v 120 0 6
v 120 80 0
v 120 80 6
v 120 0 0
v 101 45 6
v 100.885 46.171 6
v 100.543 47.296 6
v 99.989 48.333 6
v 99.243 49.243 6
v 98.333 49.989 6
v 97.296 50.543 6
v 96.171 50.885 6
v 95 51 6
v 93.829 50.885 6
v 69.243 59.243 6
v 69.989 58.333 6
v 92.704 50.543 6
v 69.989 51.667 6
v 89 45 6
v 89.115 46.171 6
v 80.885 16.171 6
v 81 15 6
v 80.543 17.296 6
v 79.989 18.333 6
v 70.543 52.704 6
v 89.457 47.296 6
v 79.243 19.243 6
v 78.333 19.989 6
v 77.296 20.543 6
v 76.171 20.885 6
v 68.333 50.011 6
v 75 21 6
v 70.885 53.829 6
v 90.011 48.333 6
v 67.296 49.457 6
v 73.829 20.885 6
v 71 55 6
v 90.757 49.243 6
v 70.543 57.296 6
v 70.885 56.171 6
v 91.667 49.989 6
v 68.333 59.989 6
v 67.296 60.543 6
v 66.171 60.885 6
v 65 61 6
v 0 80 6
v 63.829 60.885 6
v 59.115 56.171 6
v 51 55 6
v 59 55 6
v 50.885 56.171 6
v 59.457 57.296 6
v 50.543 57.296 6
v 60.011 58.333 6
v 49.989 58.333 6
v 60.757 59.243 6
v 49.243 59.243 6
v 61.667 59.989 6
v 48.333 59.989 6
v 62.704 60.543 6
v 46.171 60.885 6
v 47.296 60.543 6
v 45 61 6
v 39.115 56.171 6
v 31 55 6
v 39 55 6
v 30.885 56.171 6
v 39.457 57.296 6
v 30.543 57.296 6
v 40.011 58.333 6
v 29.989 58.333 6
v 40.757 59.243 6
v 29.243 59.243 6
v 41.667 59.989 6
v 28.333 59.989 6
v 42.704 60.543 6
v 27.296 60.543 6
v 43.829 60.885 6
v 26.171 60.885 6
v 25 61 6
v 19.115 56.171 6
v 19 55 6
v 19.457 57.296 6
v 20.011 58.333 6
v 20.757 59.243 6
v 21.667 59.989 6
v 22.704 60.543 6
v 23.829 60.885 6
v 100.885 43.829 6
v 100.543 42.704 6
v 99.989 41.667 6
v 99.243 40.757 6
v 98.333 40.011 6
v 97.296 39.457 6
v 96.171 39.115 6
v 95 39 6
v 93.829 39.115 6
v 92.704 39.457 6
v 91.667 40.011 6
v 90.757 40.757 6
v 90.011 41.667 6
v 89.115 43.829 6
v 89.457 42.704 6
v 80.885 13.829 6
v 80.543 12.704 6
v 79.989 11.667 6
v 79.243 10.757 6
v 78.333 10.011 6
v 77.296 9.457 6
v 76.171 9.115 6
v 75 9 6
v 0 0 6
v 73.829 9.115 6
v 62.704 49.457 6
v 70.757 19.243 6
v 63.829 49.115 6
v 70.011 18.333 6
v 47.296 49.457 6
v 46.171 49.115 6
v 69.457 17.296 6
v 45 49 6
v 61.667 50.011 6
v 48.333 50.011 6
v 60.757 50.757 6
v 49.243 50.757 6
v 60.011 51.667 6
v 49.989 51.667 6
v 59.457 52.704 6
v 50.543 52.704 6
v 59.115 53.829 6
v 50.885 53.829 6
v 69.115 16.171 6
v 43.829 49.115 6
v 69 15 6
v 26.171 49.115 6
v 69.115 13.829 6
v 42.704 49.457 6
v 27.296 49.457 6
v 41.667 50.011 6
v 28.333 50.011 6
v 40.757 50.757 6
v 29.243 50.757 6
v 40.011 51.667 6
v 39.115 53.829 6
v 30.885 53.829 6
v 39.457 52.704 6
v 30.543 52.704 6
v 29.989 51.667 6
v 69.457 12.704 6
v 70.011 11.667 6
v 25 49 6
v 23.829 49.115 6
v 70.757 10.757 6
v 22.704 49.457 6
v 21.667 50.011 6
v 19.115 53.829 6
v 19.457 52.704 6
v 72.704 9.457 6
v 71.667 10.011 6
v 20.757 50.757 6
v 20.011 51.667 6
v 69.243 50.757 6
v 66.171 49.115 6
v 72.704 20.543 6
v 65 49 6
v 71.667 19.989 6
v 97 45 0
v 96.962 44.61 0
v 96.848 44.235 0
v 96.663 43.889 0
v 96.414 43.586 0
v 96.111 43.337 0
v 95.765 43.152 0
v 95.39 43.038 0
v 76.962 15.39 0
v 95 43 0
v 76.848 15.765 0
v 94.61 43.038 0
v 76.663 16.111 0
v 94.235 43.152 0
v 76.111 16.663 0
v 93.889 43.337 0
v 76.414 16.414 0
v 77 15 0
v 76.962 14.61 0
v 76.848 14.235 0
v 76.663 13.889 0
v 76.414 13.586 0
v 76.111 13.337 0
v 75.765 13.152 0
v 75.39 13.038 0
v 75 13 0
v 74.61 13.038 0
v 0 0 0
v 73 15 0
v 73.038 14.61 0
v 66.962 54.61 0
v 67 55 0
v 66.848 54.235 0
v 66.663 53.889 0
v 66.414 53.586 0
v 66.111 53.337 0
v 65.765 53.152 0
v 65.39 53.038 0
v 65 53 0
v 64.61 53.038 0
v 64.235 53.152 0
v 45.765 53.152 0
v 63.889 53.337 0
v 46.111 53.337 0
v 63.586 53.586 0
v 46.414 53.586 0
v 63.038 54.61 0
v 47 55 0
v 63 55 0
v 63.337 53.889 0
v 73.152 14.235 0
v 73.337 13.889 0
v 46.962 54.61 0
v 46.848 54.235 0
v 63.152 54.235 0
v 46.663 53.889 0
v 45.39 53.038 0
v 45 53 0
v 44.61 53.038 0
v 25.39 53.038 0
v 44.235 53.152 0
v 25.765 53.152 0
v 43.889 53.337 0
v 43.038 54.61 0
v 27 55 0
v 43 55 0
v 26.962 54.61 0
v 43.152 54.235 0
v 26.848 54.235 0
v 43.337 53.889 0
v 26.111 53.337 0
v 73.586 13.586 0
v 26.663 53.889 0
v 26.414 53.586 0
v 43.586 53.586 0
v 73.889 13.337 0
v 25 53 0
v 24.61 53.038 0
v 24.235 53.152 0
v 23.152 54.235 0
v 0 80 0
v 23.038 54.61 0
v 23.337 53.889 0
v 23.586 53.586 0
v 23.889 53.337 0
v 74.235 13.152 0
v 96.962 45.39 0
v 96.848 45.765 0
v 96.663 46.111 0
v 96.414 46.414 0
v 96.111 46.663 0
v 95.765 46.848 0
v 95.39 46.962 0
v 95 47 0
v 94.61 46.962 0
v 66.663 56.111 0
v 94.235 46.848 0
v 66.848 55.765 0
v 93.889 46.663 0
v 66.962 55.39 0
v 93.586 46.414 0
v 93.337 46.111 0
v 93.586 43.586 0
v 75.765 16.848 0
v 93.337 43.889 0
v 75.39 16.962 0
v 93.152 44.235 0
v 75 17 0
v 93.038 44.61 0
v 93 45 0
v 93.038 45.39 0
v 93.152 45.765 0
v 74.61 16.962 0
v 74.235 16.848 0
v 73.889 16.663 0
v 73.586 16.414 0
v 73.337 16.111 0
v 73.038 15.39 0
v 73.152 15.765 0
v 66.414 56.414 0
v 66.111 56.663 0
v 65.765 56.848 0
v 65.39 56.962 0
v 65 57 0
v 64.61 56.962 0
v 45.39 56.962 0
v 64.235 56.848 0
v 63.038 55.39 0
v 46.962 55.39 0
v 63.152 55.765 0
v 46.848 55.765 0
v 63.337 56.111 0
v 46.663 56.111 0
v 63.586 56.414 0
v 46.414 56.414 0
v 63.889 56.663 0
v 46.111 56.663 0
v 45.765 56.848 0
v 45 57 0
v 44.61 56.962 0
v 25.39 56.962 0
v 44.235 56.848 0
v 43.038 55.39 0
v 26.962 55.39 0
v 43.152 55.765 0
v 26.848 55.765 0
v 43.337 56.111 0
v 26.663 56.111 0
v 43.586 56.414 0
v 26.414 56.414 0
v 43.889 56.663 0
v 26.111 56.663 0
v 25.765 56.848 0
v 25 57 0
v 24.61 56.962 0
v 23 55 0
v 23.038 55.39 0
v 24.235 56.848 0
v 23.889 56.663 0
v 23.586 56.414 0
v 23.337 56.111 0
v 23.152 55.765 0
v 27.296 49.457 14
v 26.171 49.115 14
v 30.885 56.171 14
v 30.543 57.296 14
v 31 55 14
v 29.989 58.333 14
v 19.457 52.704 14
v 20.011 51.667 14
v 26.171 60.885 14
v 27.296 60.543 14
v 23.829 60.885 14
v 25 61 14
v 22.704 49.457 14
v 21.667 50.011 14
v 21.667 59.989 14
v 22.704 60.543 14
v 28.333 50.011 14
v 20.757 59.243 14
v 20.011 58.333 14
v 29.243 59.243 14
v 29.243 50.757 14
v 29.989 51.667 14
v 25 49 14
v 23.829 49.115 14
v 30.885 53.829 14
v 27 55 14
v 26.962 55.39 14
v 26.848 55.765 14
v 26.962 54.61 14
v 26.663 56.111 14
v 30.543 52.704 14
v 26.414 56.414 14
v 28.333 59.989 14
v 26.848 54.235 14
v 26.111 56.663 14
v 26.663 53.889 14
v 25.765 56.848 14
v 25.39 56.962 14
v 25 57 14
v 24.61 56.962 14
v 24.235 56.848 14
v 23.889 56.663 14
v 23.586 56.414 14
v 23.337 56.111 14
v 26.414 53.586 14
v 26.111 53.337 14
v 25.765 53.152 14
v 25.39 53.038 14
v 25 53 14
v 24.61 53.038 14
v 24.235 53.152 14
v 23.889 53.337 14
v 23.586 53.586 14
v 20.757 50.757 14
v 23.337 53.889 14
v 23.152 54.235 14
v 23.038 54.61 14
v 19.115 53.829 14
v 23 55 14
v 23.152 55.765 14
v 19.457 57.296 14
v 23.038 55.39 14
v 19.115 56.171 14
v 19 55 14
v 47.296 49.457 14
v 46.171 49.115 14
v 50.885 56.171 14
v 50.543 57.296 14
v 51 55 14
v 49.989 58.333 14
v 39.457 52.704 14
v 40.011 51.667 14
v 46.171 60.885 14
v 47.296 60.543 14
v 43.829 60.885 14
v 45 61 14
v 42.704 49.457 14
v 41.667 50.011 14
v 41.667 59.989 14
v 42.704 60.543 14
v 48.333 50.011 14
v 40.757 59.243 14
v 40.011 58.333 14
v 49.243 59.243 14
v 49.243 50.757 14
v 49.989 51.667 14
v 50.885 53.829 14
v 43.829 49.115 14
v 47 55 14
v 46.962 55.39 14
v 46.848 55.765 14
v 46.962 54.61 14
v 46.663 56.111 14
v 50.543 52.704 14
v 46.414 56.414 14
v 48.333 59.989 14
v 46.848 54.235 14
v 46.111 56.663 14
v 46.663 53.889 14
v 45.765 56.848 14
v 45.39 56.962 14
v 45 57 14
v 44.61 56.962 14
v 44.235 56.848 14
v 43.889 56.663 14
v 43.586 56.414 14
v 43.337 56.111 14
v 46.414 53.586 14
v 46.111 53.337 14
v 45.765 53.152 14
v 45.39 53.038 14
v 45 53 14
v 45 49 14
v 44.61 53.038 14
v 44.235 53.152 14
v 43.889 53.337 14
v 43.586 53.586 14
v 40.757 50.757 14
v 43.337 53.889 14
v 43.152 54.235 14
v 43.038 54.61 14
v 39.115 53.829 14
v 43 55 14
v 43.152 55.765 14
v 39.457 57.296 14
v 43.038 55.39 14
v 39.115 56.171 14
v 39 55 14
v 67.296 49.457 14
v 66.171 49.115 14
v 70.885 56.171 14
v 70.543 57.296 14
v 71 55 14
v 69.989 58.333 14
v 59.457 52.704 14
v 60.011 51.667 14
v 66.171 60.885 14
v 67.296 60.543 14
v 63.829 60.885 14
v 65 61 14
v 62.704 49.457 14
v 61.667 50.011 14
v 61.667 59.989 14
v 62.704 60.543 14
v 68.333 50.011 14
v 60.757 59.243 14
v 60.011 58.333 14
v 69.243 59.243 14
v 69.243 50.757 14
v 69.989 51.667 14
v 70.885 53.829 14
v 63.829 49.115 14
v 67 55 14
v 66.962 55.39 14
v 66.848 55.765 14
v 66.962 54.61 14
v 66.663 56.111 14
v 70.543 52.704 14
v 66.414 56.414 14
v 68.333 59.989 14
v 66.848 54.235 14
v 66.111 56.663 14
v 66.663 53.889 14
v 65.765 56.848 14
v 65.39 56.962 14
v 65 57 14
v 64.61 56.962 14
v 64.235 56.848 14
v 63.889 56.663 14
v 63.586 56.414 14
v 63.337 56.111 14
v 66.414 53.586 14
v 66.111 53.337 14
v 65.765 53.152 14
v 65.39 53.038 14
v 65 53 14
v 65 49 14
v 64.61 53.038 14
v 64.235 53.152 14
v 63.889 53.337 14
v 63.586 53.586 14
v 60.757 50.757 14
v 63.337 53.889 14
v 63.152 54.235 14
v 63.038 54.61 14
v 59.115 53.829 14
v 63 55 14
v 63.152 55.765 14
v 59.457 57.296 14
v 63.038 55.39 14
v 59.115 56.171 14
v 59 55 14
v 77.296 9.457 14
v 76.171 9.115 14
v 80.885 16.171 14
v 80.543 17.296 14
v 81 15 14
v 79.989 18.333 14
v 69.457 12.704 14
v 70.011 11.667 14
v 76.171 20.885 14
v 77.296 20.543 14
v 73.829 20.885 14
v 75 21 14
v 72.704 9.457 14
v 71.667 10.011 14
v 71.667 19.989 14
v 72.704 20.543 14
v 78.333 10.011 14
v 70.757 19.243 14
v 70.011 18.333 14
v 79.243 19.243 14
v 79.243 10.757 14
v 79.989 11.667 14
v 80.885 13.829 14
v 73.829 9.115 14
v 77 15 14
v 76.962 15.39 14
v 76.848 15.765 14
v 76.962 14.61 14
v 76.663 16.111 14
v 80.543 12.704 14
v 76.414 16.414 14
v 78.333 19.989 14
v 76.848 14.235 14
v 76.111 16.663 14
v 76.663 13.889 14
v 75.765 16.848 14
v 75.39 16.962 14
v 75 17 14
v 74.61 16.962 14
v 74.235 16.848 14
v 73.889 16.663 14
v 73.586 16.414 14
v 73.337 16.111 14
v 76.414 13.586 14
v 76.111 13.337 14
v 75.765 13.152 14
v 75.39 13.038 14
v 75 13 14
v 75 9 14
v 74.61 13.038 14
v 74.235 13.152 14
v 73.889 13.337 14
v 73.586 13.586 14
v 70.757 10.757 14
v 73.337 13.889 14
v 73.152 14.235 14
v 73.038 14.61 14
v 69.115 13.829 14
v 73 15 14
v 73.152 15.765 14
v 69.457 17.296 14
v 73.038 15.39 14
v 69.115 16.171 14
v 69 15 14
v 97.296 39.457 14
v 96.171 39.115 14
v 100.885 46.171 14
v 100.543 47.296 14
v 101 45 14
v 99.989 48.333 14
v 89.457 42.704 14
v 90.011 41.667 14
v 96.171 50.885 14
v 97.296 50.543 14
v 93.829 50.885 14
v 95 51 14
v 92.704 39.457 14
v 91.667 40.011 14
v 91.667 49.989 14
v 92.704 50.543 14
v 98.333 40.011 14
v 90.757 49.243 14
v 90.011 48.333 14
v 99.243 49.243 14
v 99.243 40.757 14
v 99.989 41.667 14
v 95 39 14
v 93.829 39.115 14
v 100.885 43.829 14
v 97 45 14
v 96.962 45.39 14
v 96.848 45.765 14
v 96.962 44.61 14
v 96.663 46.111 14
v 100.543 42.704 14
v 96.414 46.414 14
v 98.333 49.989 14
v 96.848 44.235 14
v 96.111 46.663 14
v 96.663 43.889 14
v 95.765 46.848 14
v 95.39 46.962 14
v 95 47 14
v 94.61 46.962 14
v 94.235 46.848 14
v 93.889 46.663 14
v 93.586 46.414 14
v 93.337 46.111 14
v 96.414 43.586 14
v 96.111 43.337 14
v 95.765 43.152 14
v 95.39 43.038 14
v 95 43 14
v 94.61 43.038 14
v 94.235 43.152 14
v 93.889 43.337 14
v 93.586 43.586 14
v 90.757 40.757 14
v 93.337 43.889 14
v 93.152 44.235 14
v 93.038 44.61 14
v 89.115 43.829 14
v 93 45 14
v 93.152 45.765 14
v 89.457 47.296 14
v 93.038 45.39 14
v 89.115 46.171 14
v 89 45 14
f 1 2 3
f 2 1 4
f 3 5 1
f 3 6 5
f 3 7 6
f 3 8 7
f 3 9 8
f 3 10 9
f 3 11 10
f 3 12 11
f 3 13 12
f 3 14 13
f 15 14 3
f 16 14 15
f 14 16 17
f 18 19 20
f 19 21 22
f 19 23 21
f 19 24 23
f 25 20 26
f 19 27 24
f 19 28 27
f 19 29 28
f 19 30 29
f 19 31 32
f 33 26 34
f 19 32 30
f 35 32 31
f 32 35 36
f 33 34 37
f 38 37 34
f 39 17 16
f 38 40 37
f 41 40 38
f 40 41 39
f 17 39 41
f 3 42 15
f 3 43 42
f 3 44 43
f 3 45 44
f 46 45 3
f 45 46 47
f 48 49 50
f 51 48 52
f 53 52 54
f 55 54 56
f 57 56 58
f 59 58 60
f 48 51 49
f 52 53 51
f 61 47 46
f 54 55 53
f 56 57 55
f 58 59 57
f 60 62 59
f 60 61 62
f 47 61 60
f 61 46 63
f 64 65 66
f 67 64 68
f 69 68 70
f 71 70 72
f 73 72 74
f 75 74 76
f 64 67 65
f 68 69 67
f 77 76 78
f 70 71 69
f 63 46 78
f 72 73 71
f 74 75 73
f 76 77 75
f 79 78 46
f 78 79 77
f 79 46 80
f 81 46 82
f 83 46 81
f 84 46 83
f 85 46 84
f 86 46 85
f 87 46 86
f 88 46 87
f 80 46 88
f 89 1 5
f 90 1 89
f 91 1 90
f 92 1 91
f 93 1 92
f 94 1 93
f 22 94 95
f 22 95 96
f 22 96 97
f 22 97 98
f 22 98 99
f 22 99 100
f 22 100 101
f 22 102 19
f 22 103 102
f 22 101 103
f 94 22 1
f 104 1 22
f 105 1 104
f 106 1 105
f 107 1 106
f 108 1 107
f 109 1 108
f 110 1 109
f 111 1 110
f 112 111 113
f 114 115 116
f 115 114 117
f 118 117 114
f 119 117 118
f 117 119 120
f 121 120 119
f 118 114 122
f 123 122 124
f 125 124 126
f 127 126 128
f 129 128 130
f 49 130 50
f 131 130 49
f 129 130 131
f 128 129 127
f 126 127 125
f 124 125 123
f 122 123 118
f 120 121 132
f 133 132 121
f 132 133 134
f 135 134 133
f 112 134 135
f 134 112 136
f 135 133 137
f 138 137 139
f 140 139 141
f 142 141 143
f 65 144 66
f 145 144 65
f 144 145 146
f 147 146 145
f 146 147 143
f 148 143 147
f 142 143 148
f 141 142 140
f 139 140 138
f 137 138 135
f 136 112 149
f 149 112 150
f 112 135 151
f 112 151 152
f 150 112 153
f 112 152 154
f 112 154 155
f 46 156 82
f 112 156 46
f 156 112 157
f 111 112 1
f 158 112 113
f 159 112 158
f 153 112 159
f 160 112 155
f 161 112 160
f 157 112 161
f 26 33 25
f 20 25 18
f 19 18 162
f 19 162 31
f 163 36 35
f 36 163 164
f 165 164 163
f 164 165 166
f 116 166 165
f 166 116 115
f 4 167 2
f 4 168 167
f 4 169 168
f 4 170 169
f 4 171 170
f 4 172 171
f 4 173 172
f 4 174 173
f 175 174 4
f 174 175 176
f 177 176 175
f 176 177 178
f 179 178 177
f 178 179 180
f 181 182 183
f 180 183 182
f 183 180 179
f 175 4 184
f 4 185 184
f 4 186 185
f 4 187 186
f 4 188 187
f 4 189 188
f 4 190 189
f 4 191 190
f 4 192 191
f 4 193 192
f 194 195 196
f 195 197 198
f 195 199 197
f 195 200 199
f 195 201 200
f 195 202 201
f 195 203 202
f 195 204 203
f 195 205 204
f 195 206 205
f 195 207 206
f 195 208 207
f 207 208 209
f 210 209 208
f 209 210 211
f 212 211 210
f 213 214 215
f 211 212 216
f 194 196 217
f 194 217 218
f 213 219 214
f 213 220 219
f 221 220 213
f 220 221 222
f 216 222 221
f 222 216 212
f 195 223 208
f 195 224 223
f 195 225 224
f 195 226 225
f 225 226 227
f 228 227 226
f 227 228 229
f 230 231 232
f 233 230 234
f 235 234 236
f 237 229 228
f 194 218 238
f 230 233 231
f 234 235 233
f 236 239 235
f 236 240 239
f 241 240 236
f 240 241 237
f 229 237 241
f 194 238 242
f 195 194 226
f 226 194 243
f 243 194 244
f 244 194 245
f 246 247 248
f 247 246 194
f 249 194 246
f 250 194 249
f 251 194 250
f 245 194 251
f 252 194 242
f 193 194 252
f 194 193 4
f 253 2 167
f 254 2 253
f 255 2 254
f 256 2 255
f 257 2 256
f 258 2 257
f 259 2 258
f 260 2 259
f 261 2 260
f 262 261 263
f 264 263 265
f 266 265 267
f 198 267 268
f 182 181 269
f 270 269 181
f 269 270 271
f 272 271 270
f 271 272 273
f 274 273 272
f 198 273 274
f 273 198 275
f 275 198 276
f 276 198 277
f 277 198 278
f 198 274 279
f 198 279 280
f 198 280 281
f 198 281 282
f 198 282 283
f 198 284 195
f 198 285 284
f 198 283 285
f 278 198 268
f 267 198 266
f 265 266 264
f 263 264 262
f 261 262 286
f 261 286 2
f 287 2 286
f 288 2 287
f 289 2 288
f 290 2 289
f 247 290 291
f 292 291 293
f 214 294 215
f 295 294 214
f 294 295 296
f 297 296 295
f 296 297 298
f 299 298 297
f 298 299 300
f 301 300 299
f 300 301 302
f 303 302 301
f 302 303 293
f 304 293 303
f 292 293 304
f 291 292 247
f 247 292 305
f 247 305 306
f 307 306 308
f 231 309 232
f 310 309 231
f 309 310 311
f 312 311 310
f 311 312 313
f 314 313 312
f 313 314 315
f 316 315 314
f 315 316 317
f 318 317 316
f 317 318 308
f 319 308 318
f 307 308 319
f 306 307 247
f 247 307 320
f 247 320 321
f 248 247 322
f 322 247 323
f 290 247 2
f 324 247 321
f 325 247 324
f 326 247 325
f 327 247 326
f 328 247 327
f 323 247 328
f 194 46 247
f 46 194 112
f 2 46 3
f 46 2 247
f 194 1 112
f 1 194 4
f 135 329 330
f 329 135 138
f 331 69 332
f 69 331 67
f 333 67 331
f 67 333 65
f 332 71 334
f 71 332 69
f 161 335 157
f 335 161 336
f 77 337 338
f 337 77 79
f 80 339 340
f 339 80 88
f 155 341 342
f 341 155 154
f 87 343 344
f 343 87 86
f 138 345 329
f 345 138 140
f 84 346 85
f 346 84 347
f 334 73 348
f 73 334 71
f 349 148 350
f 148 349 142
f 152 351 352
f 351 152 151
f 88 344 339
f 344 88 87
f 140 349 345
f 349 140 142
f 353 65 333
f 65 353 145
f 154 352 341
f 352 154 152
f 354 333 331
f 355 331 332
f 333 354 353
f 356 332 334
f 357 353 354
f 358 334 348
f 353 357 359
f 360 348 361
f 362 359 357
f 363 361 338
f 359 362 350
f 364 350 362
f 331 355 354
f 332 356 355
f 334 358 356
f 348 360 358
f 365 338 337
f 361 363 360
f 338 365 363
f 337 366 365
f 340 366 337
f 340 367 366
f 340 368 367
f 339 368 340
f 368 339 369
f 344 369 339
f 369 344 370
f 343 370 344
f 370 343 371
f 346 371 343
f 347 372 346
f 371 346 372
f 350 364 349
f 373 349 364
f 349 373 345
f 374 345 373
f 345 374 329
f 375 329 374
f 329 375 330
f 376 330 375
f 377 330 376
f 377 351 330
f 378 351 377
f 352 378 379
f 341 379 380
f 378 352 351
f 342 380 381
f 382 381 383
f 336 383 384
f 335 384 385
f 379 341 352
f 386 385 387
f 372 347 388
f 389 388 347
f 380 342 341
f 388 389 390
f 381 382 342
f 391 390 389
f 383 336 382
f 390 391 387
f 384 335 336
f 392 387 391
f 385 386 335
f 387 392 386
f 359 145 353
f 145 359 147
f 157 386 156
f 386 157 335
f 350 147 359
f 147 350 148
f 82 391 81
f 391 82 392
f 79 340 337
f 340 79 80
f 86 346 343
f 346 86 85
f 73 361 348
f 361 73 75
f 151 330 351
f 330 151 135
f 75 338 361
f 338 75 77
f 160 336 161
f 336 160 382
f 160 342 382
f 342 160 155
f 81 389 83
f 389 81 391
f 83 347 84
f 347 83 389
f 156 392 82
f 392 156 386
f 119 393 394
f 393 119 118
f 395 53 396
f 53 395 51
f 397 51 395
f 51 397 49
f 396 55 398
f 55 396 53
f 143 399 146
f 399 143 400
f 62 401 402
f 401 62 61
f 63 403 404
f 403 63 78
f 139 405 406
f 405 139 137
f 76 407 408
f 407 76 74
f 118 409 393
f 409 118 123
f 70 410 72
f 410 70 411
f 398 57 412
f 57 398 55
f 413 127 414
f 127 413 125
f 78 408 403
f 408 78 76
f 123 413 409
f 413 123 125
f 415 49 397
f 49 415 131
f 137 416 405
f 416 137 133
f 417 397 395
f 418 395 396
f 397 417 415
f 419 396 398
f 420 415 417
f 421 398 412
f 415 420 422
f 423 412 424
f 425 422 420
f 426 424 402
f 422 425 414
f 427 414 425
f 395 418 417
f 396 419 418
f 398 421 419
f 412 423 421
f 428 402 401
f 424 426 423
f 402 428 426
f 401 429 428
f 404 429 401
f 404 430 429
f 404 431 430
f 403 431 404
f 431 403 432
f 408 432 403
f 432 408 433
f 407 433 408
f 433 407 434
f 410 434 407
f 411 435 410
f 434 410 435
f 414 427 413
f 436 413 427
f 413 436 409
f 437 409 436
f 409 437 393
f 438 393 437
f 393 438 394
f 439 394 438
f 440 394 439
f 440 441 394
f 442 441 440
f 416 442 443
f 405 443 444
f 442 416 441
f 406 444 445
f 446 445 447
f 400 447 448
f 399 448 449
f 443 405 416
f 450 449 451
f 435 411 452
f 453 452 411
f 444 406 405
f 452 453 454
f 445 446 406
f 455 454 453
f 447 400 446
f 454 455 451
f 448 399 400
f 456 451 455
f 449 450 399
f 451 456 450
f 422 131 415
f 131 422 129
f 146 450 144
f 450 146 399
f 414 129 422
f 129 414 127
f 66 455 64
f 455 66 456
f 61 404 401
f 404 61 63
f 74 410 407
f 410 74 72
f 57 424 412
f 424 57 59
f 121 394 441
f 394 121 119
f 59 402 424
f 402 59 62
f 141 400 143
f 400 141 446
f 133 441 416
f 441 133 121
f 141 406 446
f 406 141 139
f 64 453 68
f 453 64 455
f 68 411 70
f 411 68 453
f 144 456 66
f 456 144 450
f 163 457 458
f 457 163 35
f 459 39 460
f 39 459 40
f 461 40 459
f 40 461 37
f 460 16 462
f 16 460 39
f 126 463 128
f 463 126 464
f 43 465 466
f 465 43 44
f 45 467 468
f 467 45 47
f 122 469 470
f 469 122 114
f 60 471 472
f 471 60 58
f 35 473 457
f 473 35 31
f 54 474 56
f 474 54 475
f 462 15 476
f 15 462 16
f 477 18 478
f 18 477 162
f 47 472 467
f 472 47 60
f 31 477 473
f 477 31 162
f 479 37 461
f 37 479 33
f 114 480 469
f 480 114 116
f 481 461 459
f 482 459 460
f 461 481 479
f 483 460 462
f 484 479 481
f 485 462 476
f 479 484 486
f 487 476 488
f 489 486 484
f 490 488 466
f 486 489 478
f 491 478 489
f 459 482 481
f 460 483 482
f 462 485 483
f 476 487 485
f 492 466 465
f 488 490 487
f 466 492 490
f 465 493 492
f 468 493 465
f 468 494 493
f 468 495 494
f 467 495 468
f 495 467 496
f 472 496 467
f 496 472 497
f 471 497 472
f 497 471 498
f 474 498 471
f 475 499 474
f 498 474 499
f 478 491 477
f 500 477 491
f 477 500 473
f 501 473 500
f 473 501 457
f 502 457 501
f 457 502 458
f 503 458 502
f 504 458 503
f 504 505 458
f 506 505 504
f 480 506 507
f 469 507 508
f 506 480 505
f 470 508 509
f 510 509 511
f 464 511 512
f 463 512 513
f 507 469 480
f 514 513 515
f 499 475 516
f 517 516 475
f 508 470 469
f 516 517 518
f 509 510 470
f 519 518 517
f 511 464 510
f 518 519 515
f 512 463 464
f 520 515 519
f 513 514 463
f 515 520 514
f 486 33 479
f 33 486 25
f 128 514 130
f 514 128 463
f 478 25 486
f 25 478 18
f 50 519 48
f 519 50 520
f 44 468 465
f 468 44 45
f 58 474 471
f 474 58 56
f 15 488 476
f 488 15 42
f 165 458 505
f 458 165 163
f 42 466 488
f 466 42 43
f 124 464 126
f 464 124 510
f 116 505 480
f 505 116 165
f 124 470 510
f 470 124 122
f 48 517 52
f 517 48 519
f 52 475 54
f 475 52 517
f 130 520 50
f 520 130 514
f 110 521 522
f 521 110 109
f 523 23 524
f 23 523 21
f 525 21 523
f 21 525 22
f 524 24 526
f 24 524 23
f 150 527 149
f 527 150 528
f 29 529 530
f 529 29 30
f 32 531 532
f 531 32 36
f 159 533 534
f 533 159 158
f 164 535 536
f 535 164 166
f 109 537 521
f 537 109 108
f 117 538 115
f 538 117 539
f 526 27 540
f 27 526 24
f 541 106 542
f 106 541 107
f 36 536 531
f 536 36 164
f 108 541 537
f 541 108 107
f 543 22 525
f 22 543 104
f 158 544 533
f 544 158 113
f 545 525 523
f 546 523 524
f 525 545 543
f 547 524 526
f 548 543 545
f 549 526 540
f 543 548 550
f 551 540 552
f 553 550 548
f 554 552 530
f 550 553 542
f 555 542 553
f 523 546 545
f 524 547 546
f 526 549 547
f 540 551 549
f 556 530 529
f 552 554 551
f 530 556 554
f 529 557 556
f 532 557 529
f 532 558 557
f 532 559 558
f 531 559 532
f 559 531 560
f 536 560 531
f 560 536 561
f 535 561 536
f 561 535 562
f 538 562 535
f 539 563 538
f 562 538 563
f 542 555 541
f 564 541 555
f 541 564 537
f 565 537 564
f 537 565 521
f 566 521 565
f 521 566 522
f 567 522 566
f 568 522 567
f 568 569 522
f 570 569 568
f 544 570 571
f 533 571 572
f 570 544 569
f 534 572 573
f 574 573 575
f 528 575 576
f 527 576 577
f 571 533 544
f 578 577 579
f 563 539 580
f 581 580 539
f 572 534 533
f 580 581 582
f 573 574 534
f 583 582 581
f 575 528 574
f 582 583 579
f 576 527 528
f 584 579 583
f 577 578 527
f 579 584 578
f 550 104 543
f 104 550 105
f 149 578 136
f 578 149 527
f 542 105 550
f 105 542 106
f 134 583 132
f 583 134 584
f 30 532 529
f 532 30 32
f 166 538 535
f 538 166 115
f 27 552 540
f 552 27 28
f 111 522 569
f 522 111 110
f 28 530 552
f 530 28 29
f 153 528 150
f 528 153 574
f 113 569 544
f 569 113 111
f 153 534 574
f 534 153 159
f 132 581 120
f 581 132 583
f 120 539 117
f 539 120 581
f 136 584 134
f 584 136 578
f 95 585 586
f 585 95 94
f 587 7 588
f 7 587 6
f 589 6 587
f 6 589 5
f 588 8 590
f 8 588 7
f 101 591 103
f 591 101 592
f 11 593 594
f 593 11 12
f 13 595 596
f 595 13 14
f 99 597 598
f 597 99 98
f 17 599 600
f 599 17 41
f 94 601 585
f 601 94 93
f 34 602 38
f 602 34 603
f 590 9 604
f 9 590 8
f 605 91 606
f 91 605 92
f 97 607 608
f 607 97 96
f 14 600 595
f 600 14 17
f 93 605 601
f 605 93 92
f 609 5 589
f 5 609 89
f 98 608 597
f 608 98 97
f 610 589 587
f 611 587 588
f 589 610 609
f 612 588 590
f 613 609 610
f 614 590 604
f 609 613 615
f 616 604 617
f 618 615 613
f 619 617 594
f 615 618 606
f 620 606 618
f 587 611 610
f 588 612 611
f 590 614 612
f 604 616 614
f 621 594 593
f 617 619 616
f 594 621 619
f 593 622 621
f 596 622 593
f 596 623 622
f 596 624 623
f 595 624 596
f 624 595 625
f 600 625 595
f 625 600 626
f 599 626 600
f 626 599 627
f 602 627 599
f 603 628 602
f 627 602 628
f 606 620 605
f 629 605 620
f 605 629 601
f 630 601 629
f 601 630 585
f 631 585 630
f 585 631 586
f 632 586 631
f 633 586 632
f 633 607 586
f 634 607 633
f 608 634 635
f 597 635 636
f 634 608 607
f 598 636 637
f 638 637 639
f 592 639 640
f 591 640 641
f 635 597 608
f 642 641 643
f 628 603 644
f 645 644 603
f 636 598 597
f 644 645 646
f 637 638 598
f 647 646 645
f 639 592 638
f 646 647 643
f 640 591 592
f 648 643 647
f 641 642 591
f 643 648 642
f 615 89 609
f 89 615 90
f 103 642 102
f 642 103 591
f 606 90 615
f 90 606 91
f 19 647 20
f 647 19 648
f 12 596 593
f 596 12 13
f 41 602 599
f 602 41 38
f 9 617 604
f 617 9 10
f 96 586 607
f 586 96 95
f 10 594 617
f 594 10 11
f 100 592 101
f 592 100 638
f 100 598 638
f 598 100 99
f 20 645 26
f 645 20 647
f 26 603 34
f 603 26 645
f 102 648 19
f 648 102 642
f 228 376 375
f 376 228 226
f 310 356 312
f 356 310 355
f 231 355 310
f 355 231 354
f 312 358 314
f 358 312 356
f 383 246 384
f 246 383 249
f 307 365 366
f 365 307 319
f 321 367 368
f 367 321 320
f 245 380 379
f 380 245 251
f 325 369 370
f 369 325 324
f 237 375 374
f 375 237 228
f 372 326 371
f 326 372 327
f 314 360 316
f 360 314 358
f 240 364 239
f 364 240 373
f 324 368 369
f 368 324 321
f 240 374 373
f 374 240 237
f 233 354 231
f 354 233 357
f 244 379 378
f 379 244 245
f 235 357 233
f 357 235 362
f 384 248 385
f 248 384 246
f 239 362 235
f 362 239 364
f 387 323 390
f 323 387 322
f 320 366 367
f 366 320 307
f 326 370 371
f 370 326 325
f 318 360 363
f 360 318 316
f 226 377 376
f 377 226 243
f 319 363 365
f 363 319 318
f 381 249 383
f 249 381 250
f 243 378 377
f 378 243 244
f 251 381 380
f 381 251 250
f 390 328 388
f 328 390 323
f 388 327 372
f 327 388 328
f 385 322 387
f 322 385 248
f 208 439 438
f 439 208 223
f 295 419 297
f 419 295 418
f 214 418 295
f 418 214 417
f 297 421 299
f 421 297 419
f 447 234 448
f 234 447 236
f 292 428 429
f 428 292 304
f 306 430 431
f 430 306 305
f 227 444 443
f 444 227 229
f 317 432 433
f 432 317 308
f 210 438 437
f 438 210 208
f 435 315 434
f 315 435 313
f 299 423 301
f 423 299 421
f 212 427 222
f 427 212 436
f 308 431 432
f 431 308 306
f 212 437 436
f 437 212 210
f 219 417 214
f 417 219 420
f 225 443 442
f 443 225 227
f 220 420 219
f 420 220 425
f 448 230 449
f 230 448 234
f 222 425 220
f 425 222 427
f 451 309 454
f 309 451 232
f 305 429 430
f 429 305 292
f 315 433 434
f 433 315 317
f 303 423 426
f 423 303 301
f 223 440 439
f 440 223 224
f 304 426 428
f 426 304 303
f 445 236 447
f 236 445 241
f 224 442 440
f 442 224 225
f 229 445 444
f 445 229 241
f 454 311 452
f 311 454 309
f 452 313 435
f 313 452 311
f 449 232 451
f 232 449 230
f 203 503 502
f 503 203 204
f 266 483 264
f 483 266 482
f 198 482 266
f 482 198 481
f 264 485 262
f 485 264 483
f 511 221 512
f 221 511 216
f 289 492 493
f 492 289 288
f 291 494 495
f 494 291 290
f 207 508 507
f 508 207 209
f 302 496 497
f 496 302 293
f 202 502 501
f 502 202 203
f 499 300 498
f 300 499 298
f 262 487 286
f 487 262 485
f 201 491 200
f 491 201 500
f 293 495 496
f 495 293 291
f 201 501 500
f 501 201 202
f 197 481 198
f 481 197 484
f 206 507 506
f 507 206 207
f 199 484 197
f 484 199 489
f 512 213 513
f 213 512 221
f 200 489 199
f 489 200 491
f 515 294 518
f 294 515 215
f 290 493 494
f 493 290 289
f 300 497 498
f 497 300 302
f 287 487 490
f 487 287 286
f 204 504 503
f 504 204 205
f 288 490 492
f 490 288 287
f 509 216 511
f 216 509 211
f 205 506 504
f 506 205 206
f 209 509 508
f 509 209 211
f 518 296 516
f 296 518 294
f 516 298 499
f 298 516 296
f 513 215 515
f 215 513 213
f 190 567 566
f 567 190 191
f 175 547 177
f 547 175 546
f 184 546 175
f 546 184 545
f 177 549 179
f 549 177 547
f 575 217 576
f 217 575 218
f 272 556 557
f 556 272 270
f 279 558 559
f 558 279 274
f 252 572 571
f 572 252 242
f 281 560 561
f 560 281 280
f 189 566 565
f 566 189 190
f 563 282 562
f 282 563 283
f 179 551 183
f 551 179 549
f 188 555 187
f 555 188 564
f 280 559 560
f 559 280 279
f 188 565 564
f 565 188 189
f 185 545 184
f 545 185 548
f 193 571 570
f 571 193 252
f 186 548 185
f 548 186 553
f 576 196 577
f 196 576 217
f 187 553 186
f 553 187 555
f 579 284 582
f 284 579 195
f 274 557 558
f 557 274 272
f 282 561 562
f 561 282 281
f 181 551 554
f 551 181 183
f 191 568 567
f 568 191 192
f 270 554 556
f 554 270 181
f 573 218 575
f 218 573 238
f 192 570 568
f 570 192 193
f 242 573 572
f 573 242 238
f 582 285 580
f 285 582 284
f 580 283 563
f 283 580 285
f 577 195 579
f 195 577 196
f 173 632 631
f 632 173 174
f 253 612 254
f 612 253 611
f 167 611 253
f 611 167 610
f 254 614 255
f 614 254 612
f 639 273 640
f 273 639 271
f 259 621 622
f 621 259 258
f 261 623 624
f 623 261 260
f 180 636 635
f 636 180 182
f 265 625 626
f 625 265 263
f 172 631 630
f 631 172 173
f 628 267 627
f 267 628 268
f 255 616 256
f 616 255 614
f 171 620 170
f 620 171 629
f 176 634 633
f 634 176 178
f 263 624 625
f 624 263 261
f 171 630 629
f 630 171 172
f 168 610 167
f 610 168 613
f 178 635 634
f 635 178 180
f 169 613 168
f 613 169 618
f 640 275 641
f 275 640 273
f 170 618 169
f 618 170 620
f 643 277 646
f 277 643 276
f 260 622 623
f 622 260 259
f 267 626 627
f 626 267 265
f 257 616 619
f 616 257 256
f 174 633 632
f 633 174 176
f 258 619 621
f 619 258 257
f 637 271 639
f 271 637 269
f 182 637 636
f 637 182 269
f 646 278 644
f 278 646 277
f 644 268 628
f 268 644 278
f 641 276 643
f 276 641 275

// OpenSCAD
$fn = 32;

// ----------------------------------------------------------------------
// Boss field: plate with bosses at given coordinates
// ----------------------------------------------------------------------

// --- parameters (mm) ---
plate_l = 120;            // plate length, X
plate_w = 80;             // plate width, Y
plate_t = 6;              // plate thickness, Z
boss_d = 12;              // boss diameter
boss_h = 8;               // boss height above the plate
bore_d = 4;               // boss bore
fit_tol = 0.1;            // tolerance for press fits, mm
free_tol = 0.3;           // tolerance for clearance fits, mm

total_h = plate_t + boss_h;  // overall height

difference() {
  union() {
    cube([plate_l, plate_w, plate_t]);
    translate([25, 55, plate_t]) cylinder(h = boss_h, d = boss_d);
    translate([45, 55, plate_t]) cylinder(h = boss_h, d = boss_d);
    translate([65, 55, plate_t]) cylinder(h = boss_h, d = boss_d);
    translate([75, 15, plate_t]) cylinder(h = boss_h, d = boss_d);
    translate([95, 45, plate_t]) cylinder(h = boss_h, d = boss_d);
  }
  translate([25, 55, -1]) cylinder(h = total_h + 2, d = bore_d);
  translate([45, 55, -1]) cylinder(h = total_h + 2, d = bore_d);
  translate([65, 55, -1]) cylinder(h = total_h + 2, d = bore_d);
  translate([75, 15, -1]) cylinder(h = total_h + 2, d = bore_d);
  translate([95, 45, -1]) cylinder(h = total_h + 2, d = bore_d);
}
